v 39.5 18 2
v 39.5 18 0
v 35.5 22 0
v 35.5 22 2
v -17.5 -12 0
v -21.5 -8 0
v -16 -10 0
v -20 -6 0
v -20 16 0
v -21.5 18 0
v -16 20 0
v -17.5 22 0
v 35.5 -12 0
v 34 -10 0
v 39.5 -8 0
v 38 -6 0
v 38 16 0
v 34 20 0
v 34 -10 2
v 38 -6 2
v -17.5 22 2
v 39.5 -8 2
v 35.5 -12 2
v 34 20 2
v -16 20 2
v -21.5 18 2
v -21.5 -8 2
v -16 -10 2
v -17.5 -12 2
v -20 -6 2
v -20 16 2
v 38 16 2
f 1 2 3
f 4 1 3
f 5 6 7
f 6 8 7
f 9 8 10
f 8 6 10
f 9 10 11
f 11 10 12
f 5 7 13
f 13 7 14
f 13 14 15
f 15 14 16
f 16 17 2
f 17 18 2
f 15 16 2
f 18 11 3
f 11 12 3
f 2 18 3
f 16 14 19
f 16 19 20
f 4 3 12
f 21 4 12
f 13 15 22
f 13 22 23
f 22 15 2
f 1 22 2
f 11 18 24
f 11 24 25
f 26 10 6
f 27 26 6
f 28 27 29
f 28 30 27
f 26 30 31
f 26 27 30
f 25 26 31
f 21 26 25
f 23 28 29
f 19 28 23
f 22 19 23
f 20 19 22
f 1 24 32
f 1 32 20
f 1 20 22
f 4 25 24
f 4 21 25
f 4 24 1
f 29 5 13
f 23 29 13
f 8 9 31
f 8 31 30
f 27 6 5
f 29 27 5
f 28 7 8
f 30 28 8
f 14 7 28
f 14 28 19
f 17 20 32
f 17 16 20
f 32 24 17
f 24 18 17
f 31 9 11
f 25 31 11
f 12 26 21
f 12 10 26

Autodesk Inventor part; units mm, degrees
ref_plane "YZ Plane" through (0, 0, 0) normal (1, 0, 0) x (0, 1, 0)
ref_plane "XZ Plane" through (0, 0, 0) normal (0, 1, 0) x (-1, 0, 0)
ref_plane "XY Plane" through (0, 0, 0) normal (0, 0, 1) x (1, 0, 0)
sketch "Эскиз1" plane through (0, 0, 0) normal (0, 0, 1) x (1, 0, 0)
  line L0 (-16, -10) -> (34, -10)
  line L1 (38, -6) -> (38, 16)
  line L2 (34, 20) -> (-16, 20)
  line L3 (-20, 16) -> (-20, -6)
  line L4 (-20, 16) -> (-16, 20)
  line L5 (-16, -10) -> (-20, -6)
  line L6 (34, 20) -> (38, 16)
  line L7 (34, -10) -> (38, -6)
  line L8 (-18, -13.8) -> (-18, 33.1) construction
  line L9 (36, -15.5) -> (36, 27.4) construction
  line L10 (-22.5, 15) -> (39.4, 15) construction
  line L11 (-26.6, 10) -> (40.2, 10) construction
  line L12 (-27.2, 5) -> (41.5, 5) construction
  line L13 (-27.8, 0) -> (41.6, 0) construction
  line L14 (-27.6, -5) -> (40.5, -5) construction
  line L15 (-17.5, -12) -> (35.5, -12)
  line L16 (39.5, -8) -> (39.5, 18)
  line L17 (35.5, 22) -> (-17.5, 22)
  line L18 (-21.5, 18) -> (-21.5, -8)
  line L19 (-21.5, 18) -> (-17.5, 22)
  line L20 (39.5, -8) -> (35.5, -12)
  line L21 (39.5, 18) -> (35.5, 22)
  line L22 (39.5, -8) -> (35.5, -12)
  line L23 (-21.5, -8) -> (-17.5, -12)
  point P0 (-20, -10)
  point P1 (38, 20)
  point P2 (38, -10)
  point P3 (-20, 20)
  point P4 (-18, 15)
  point P5 (-18, 10)
  point P6 (-18, 5)
  point P7 (36, 15)
  point P8 (36, 10)
  point P9 (36, 5)
  point P10 (36, 0)
  point P11 (36, -5)
  point P12 (-21.5, -12)
  point P13 (39.5, 22)
  point P14 (39.5, -12)
  point P15 (-21.5, 22)
  point P16 (39.5, -12)
  dimension "d0" = 58
  dimension "d1" = 30
  dimension "d2" = 4
  dimension "d3" = 4
  dimension "d4" = 4
  dimension "d5" = 4
  dimension "d6" = 4
  dimension "d7" = 4
  dimension "d8" = 4
  dimension "d9" = 4
  dimension "d12" = 2
  dimension "d13" = 2
  dimension "d14" = 5
  dimension "d15" = 5
  dimension "d16" = 5
  dimension "d17" = 5
  dimension "d18" = 5
  dimension "d42" = 2
  dimension "d43" = 2
  dimension "d44" = 1.5
  dimension "d45" = 1.5
  dimension "d46" = 4
  dimension "d47" = 4
  dimension "d48" = 4
  dimension "d49" = 4
  dimension "d50" = 4
  dimension "d51" = 4
  dimension "d52" = 4
  dimension "d53" = 4
  dimension "d54" = 4
  dimension "d55" = 4
extrude "Выдавливание2" add sketch "Эскиз1" along normal blind 2
equation "\"d3\" = d2"
equation "\"d4\" = d2"
equation "\"d5\" = d4"
equation "\"d6\" = d2"
equation "\"d7\" = d6"
equation "\"d8\" = d2"
equation "\"d9\" = d8"
equation "\"d47\" = d46"
equation "\"d49\" = d48"
equation "\"d51\" = d50"
equation "\"d53\" = d52"
equation "\"d54\" = d52"
equation "\"d55\" = d54"
equation "\"Радиус_гибки\" = Толщина"
equation "\"Ширина_просечки\" = Толщина"
equation "\"Глубина_просечки\" = 0.5 * Толщина"
equation "\"Размер_высечки\" = 4 * Толщина"
equation "\"Мин_остаток\" = 2 * Толщина"
equation "\"Радиус_перехода\" = Радиус_гибки"
equation "\"Радиус_Якоби\" = Радиус_гибки"
equation "\"Размер_зазора\" = Толщина"
equation "\"Толщина\" = 0.5"
properties part number "клей" material "По умолчанию"
